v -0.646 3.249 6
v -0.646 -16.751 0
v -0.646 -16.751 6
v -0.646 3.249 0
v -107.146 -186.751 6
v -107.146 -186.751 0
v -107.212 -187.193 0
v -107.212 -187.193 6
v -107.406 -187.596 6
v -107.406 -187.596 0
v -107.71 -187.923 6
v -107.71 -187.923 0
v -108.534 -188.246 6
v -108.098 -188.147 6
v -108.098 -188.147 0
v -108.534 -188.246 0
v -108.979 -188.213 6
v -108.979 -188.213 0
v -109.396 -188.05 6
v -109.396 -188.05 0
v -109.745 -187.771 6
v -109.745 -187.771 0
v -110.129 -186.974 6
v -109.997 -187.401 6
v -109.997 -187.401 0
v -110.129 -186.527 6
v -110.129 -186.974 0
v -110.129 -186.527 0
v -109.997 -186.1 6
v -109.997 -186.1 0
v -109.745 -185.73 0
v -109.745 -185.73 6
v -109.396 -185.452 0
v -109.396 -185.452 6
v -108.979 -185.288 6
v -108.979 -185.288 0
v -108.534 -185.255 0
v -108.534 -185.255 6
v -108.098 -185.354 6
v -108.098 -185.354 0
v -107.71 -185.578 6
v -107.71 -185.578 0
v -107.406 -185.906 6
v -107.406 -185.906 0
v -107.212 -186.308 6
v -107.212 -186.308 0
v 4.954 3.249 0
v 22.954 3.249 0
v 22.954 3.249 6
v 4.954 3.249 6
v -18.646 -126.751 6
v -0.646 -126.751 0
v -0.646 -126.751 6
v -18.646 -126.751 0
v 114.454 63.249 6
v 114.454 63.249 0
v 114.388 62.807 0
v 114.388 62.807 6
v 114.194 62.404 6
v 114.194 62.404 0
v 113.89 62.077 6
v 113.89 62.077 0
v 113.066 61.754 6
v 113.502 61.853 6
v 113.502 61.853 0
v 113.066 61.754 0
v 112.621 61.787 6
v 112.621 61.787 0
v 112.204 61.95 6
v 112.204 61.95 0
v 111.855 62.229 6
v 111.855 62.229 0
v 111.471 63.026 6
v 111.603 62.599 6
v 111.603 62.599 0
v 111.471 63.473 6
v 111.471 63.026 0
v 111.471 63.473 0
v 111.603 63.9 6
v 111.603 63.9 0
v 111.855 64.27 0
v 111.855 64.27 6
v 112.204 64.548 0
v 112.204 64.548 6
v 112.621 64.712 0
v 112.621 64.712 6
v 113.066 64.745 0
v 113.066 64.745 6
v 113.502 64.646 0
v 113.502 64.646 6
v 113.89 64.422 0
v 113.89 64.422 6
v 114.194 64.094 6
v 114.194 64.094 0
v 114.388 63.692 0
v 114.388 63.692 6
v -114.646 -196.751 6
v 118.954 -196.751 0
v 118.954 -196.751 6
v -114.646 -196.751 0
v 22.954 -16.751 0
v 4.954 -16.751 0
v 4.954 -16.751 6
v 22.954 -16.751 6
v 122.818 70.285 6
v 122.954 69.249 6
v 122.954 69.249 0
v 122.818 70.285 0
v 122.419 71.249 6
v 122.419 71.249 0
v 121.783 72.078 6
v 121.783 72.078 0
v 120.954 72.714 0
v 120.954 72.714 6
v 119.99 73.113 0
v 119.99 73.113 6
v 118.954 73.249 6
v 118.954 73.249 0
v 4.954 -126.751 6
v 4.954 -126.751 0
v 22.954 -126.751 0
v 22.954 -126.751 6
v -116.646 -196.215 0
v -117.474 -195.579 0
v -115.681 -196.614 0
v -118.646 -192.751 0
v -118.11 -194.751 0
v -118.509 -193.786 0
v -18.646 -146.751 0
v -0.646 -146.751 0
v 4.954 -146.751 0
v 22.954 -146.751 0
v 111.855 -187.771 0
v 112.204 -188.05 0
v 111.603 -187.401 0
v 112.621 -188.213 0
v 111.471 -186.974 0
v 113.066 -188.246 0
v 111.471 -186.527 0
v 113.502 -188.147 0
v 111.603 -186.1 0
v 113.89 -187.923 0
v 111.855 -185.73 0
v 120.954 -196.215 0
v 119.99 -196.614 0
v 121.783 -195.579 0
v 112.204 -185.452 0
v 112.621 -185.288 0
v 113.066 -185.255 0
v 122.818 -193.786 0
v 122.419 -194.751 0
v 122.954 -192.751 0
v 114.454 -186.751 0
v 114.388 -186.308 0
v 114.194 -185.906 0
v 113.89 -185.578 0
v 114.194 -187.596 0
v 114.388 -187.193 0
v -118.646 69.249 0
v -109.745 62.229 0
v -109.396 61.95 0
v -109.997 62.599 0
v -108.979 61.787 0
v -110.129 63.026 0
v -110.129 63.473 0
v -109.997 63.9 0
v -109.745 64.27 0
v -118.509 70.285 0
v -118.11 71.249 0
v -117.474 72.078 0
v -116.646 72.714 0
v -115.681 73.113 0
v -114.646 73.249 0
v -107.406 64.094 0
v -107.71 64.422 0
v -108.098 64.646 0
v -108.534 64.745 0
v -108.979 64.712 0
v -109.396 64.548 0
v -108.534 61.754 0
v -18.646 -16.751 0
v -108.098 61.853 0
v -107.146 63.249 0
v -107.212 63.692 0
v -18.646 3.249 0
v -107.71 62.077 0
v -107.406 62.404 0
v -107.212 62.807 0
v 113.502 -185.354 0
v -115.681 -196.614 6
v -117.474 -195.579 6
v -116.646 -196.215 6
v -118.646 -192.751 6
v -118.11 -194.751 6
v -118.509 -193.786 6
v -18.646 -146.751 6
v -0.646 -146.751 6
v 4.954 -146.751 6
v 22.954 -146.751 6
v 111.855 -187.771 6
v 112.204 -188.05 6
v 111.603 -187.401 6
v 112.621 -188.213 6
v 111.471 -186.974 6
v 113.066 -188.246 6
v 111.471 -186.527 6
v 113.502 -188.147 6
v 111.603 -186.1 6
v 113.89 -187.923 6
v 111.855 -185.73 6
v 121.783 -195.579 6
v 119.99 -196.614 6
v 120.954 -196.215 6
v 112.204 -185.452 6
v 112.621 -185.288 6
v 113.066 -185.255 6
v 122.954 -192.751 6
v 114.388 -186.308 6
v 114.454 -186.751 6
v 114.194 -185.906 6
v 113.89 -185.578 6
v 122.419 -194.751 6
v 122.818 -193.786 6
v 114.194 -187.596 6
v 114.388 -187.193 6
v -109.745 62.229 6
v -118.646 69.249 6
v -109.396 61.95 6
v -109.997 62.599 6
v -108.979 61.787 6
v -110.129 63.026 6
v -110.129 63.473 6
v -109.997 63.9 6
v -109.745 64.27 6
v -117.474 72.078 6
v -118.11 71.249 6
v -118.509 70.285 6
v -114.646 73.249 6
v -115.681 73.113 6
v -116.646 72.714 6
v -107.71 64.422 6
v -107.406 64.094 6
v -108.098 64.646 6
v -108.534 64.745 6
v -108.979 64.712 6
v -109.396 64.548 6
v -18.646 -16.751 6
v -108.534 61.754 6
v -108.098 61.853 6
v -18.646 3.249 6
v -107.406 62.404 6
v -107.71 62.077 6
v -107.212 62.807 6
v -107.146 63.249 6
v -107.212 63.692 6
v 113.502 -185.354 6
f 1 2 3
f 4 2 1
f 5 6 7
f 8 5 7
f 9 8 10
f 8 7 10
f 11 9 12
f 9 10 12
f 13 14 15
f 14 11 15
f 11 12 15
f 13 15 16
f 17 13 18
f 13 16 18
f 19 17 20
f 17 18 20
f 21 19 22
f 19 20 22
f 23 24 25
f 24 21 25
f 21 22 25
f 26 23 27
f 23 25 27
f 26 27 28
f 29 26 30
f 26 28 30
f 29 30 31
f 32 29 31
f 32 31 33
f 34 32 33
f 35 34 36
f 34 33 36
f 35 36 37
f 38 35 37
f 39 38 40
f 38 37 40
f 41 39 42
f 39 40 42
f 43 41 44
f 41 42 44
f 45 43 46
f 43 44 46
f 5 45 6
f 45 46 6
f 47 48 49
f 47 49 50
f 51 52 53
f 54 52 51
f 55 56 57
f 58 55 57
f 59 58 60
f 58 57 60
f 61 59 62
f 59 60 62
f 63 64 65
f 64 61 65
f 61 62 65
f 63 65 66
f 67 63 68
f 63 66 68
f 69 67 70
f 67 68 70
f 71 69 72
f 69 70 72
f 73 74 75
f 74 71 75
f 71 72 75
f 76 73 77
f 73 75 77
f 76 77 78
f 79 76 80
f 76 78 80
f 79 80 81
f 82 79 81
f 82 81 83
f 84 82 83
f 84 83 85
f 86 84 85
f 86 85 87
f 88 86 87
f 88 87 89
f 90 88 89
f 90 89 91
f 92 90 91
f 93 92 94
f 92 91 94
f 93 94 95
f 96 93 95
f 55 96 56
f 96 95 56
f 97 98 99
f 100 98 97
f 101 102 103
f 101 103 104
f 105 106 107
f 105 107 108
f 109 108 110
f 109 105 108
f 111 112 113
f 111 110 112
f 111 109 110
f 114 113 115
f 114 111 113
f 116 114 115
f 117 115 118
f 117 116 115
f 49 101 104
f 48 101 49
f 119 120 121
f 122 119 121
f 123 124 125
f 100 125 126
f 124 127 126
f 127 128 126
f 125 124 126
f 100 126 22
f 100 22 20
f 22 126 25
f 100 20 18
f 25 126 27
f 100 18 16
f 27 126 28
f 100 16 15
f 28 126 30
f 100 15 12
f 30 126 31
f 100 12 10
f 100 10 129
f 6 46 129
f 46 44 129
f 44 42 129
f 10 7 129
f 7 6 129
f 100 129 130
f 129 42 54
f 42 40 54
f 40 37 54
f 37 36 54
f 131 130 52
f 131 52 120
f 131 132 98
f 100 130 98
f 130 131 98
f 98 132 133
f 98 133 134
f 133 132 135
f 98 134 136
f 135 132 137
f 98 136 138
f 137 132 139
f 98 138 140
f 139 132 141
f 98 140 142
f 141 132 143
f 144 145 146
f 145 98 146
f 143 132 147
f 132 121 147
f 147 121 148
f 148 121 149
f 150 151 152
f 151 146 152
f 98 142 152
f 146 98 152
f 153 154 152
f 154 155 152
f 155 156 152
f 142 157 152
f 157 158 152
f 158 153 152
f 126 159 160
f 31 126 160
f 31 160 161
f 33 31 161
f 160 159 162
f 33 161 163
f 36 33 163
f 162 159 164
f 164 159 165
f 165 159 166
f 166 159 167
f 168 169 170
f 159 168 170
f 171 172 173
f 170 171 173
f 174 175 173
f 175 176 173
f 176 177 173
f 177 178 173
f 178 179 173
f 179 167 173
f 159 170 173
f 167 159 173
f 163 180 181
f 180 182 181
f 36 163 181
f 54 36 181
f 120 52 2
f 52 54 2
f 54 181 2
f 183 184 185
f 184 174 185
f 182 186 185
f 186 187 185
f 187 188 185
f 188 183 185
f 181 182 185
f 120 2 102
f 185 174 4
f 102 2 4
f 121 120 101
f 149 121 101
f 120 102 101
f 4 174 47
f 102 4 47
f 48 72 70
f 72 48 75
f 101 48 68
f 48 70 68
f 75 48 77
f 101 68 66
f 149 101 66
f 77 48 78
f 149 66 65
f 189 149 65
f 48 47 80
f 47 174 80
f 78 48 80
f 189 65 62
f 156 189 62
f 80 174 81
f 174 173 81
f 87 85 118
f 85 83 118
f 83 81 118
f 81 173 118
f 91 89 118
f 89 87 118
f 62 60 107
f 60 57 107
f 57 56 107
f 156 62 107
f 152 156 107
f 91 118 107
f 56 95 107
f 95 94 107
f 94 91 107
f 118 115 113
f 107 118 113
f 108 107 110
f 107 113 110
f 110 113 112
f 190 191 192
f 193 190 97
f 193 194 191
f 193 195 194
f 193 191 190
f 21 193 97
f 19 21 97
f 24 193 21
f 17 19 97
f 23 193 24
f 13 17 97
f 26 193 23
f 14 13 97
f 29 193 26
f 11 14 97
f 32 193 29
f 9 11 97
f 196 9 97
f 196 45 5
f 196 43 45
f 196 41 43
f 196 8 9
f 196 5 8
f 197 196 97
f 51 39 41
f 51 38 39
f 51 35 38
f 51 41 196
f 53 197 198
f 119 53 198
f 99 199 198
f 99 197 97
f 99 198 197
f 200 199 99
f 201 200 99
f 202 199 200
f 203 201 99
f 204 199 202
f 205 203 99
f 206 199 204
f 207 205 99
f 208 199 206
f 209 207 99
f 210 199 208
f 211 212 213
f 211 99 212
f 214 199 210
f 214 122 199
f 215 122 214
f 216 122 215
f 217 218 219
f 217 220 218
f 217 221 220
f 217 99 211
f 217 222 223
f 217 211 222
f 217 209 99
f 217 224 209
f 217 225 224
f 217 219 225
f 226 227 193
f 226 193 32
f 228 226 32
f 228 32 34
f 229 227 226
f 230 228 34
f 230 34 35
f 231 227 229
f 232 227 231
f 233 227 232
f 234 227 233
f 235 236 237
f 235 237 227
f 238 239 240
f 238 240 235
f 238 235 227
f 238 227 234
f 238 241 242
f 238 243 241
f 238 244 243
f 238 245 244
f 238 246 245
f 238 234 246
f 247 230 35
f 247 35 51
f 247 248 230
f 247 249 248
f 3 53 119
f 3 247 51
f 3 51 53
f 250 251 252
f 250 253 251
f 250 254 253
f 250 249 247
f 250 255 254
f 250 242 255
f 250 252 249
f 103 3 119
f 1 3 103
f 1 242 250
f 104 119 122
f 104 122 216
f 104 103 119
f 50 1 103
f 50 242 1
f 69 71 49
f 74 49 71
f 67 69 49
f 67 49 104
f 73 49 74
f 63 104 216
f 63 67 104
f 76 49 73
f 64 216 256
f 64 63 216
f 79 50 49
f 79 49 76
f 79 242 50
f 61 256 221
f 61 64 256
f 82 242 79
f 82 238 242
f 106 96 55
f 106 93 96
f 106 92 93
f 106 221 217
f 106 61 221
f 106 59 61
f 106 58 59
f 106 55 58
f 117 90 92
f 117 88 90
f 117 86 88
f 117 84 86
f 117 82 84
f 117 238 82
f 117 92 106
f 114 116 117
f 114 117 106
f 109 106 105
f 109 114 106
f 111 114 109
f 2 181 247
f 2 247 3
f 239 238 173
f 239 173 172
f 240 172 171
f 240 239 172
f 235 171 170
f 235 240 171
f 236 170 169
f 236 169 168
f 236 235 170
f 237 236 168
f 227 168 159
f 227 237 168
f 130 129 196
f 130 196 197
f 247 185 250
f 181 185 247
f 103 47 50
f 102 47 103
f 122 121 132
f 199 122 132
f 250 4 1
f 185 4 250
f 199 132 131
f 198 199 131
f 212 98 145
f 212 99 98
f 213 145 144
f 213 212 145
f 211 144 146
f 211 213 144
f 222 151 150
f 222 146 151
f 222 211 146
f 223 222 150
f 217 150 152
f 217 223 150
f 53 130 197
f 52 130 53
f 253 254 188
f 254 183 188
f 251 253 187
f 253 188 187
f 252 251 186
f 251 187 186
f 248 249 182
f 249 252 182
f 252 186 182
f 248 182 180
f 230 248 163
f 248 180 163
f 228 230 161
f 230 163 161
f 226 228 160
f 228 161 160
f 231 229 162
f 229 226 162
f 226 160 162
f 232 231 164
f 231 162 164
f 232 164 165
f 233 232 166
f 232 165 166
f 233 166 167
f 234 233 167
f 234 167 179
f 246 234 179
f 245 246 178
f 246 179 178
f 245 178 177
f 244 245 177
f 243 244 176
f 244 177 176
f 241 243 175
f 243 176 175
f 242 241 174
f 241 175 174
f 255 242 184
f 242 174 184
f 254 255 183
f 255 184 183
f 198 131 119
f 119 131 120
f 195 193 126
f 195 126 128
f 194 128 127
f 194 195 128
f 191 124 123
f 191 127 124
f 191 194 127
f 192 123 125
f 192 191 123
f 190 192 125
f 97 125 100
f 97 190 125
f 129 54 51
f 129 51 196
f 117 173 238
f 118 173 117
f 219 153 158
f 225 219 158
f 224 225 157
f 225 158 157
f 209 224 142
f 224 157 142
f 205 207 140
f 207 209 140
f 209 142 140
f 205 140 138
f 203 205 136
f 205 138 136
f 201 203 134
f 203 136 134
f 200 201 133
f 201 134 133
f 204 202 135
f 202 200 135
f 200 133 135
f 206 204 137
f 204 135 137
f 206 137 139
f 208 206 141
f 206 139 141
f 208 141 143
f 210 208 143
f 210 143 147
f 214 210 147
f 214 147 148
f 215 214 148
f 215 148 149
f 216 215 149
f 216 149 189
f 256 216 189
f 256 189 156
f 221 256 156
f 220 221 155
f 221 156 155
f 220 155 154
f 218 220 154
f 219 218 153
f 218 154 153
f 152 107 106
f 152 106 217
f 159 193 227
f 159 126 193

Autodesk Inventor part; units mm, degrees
ref_plane "YZ Plane" through (0, 0, 0) normal (1, 0, 0) x (0, 1, 0)
ref_plane "XZ Plane" through (0, 0, 0) normal (0, 1, 0) x (-1, 0, 0)
ref_plane "XY Plane" through (0, 0, 0) normal (0, 0, 1) x (1, 0, 0)
sketch "Sketch1" plane through (0, 0, 0) normal (0, 0, 1) x (1, 0, 0)
  line L0 (-118.6456, 73.2494) -> (122.9544, 73.2494)
  line L1 (122.9544, 73.2494) -> (122.9544, -196.7506)
  line L2 (122.9544, -196.7506) -> (-118.6456, -196.7506)
  line L3 (-118.6456, -196.7506) -> (-118.6456, 73.2494)
  circle A0 centre (-108.6456, 63.2494) radius 1.5
  circle A1 centre (112.9544, 63.2494) radius 1.5
  circle A2 centre (-108.6456, -186.7506) radius 1.5
  circle A3 centre (112.9544, -186.7506) radius 1.5
  point P0 (0, 0)
  dimension "d0" = 241.6
  dimension "d1" = 270
  dimension "d2" = 10
  dimension "d3" = 10
  dimension "d4" = 3
  dimension "d5" = 10
  dimension "d6" = 10
  dimension "d7" = 3
  dimension "d8" = 10
  dimension "d9" = 10
  dimension "d10" = 3
  dimension "d11" = 10
  dimension "d12" = 10
  dimension "d13" = 3
extrude "Extrusion1" add sketch "Sketch1" along normal blind 6
fillet "Fillet1" radius 4 4 edges at (-118.6456, 73.2494, 3) (122.9544, 73.2494, 3) (122.9544, -196.7506, 3) (-118.6456, -196.7506, 3)
sketch "Sketch2" plane through (0, 0, 0) normal (0, 0, -1) x (-1, 0, 0)
  line L0 (-22.9544, 3.2494) -> (-4.9544, 3.2494)
  line L1 (-4.9544, 3.2494) -> (-4.9544, -16.7506)
  line L2 (-4.9544, -16.7506) -> (-22.9544, -16.7506)
  line L3 (-22.9544, -16.7506) -> (-22.9544, 3.2494)
  line L4 (18.6456, -16.7506) -> (0.6456, -16.7506)
  line L5 (0.6456, -16.7506) -> (0.6456, 3.2494)
  line L6 (0.6456, 3.2494) -> (18.6456, 3.2494)
  line L7 (18.6456, 3.2494) -> (18.6456, -16.7506)
  line L8 (-22.9544, -146.7506) -> (-4.9544, -146.7506)
  line L9 (-4.9544, -146.7506) -> (-4.9544, -126.7506)
  line L10 (-4.9544, -126.7506) -> (-22.9544, -126.7506)
  line L11 (-22.9544, -126.7506) -> (-22.9544, -146.7506)
  line L12 (0.6456, -126.7506) -> (18.6456, -126.7506)
  line L13 (18.6456, -126.7506) -> (18.6456, -146.7506)
  line L14 (18.6456, -146.7506) -> (0.6456, -146.7506)
  line L15 (0.6456, -146.7506) -> (0.6456, -126.7506)
  line L16 (-122.9544, -192.7506) -> (-122.9544, 69.2494) projected
  line L17 (-118.9544, 73.2494) -> (114.6456, 73.2494) projected
  line L18 (118.6456, 69.2494) -> (118.6456, -192.7506) projected
  line L19 (114.6456, -196.7506) -> (-118.9544, -196.7506) projected
  point P0 (0, 0)
  dimension "d17" = 100
  dimension "d18" = 18
  dimension "d19" = 20
  dimension "d20" = 70
  dimension "d21" = 18
  dimension "d22" = 100
  dimension "d23" = 20
  dimension "d24" = 70
  dimension "d25" = 70
  dimension "d26" = 70
  dimension "d27" = 100
  dimension "d28" = 100
  dimension "d29" = 20
  dimension "d30" = 18
  dimension "d31" = 20
extrude "Extrusion3" cut sketch "Sketch2" against normal blind 6
properties part number "Etage 1"
